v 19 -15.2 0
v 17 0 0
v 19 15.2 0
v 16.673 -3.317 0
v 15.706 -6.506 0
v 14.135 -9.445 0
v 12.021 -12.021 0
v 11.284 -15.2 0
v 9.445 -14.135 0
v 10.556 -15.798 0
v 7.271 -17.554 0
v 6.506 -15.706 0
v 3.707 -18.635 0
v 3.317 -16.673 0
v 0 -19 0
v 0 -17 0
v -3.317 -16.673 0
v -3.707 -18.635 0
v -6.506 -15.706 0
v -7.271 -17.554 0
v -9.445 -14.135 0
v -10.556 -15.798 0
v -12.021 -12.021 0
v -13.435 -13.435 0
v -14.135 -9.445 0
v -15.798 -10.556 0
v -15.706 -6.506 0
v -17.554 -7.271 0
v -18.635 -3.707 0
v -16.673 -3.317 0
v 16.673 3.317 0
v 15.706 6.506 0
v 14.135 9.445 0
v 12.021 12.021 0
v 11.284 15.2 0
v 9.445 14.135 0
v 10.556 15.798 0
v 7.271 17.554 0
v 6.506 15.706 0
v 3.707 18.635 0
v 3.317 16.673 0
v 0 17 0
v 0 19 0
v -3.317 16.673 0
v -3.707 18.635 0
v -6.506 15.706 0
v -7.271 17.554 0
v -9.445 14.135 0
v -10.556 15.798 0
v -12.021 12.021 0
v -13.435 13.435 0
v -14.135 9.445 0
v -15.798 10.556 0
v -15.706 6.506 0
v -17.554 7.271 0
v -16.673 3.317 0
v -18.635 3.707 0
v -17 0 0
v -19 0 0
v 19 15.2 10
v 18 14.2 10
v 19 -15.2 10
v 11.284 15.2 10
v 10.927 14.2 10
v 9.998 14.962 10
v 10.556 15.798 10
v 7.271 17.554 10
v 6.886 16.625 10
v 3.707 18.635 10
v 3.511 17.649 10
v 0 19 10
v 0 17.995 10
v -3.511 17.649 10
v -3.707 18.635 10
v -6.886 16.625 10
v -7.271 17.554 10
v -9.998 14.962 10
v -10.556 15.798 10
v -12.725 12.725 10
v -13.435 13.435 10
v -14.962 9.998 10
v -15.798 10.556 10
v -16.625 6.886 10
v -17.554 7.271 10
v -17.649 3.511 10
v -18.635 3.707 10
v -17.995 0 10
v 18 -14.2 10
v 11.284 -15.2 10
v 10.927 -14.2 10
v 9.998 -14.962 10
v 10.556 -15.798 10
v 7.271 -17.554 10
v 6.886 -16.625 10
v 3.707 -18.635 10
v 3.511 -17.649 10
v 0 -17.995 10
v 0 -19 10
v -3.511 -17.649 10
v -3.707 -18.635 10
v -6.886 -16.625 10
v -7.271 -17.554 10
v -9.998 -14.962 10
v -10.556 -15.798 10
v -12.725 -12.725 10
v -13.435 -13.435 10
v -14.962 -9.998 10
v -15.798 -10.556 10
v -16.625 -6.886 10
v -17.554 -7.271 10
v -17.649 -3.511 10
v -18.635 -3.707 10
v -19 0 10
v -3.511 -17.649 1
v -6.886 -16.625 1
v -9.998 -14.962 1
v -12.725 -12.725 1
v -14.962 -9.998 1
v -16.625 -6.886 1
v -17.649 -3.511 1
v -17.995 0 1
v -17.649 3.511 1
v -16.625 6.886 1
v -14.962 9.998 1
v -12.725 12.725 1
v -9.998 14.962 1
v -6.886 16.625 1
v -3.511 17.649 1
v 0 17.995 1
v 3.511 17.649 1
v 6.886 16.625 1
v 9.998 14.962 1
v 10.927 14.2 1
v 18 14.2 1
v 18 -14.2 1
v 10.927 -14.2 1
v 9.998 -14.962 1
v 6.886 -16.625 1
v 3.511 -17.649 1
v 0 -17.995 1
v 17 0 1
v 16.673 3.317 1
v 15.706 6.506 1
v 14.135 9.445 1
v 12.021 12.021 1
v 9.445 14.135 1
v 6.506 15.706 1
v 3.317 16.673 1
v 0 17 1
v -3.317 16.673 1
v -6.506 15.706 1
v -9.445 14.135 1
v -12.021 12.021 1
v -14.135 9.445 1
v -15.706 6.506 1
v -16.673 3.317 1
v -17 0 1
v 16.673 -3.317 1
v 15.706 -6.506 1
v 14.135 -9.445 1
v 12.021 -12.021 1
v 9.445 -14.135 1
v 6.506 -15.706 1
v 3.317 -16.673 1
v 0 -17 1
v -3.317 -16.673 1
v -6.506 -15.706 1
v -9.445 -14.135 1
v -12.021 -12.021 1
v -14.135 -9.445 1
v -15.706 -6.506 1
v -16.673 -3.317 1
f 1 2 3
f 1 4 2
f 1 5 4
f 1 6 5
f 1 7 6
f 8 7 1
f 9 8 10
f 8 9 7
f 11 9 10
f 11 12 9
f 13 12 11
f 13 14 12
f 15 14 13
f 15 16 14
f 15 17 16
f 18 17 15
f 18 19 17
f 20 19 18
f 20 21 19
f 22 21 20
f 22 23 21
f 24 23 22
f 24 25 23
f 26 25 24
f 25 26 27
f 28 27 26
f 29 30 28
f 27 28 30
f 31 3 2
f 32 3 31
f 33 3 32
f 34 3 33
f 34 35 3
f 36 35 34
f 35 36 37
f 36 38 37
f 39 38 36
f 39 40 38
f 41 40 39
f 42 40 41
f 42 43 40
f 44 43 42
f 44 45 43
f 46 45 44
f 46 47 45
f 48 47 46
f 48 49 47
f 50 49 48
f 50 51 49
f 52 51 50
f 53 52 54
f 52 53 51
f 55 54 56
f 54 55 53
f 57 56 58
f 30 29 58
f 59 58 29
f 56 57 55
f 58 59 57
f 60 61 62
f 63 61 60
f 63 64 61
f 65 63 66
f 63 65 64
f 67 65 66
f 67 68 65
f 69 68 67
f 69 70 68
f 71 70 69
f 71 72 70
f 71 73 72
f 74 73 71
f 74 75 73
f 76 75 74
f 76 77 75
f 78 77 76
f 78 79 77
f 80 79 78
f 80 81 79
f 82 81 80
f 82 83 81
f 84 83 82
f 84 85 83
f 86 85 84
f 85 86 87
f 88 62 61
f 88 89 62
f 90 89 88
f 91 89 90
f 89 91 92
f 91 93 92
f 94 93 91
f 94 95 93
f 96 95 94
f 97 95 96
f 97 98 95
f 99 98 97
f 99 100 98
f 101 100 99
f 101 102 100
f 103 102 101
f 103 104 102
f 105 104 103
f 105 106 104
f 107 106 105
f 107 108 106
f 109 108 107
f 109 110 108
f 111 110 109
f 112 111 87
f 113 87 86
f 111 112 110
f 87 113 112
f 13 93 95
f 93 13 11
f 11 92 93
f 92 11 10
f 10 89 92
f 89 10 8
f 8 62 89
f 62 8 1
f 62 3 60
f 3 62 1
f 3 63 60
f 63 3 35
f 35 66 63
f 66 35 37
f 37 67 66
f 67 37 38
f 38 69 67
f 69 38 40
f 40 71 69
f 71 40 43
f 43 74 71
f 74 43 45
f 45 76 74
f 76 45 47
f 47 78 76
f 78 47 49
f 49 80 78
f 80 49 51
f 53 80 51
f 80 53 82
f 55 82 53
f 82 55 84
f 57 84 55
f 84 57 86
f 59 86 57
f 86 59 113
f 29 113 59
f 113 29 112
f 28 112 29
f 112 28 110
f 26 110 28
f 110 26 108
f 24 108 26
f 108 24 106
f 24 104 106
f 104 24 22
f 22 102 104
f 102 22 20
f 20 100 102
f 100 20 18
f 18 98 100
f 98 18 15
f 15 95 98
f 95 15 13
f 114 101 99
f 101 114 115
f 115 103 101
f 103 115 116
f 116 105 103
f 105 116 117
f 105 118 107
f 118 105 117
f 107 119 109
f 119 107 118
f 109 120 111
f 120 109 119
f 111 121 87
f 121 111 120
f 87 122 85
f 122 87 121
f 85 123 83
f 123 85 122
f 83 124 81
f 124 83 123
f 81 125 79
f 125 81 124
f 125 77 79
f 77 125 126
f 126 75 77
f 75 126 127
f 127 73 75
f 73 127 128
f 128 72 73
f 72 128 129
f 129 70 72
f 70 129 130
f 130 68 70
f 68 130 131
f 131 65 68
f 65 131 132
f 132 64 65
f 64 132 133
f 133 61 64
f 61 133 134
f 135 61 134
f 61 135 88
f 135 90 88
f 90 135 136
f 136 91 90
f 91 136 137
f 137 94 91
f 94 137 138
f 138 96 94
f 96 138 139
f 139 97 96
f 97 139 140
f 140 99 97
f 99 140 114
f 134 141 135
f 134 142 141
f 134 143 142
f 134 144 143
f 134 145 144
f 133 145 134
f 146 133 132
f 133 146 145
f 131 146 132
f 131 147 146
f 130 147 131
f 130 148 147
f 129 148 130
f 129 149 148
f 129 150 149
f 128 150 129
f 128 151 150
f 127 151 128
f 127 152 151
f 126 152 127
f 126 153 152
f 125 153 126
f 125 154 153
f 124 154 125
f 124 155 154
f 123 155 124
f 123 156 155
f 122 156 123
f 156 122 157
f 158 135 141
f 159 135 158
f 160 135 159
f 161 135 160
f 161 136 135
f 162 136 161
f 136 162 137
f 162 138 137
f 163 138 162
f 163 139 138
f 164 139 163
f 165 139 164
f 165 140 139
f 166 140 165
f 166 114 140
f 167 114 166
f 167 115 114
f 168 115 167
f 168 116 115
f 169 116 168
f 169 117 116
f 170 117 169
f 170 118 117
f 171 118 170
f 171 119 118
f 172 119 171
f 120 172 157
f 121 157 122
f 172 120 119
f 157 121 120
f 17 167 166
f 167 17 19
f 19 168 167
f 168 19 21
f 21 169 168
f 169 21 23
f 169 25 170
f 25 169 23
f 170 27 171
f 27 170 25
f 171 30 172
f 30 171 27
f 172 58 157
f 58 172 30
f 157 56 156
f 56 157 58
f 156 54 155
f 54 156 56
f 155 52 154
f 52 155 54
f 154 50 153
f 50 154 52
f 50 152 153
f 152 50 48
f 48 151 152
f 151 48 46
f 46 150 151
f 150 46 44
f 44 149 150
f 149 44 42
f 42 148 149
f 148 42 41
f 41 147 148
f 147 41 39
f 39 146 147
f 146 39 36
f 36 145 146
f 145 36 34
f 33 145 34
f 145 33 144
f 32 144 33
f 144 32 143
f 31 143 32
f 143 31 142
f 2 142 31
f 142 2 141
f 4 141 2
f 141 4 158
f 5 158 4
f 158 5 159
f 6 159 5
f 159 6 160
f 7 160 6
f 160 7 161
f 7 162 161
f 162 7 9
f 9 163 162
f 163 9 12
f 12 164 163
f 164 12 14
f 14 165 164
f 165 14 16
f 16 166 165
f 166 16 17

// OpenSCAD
// file: oem/mr08d_024022_motor.scad
function vMR08D024022MotorDatasheet() =
     [["terminal_hole_diameter", 1.6], ["terminal_thickness", 0.45],
      ["terminal_length", 5.7], ["terminal_width", 3.75],
      ["length", 100.5], ["motor_diameter", 37], ["bottom_diameter", 36],
      ["airway_to_bottom", 16.7], ["shaft_hole_diameter", 3],
      ["shaft_hole_offset", 10.7], ["shaft_length", 28],
      ["shaft_diameter", 8], ["bearing_diameter", 16],
      ["gear_box_length", 42], ["gear_box_diameter", 34],
      ["mount_angles", [-135, -45, 45, 135]],
      ["mount_diameter", 24], ["mount_hole_diameter", 3]];

module mMR08D024022Motor() {
     rotate([-19, 0, 0]) {
          rotate([0, 90, 0]) {
               // TODO(hidmic): revisar!
               translate([0.02841282, 0, 28-144.04437256]) {
                    import("stl/MR08D-024022.stl");
               }
          }
     }
}

mMR08D024022Motor();
// main file
include <generic/lib.scad>;

use <oem/mr08d_024022_motor.scad>;
// use <oem/35x1_5mm_oring.scad>;


function vMR08DMotorRearCapDatasheet() =
     let (motor_datasheet=vMR08D024022MotorDatasheet())
     [["main_diameter", property(motor_datasheet, "bottom_diameter") + 2],
      ["seat_diameter", property(motor_datasheet, "bottom_diameter") - 2],
      ["main_height", 10], ["wall_thickness", 1]];

module mMR08DMotorRearCap() {
     datasheet = vMR08DMotorRearCapDatasheet();
     main_diameter = property(datasheet, "main_diameter");
     seat_diameter = property(datasheet, "seat_diameter");
     main_height = property(datasheet, "main_height");
     wall_thickness = property(datasheet, "wall_thickness");

     module front_view_section() {
          union() {
               translate([main_diameter / 4, 0]) {
                    square([main_diameter / 2, main_diameter * 0.8], center=true);
               }
               circle(d=main_diameter);
          }
     }

     linear_extrude(height=main_height) {
          outline(delta=-wall_thickness) {
               front_view_section();
          }
     }
     linear_extrude(height=wall_thickness) {
          difference() {
               front_view_section();
               circle(d=seat_diameter);
          }
     }
}

mMR08DMotorRearCap();
